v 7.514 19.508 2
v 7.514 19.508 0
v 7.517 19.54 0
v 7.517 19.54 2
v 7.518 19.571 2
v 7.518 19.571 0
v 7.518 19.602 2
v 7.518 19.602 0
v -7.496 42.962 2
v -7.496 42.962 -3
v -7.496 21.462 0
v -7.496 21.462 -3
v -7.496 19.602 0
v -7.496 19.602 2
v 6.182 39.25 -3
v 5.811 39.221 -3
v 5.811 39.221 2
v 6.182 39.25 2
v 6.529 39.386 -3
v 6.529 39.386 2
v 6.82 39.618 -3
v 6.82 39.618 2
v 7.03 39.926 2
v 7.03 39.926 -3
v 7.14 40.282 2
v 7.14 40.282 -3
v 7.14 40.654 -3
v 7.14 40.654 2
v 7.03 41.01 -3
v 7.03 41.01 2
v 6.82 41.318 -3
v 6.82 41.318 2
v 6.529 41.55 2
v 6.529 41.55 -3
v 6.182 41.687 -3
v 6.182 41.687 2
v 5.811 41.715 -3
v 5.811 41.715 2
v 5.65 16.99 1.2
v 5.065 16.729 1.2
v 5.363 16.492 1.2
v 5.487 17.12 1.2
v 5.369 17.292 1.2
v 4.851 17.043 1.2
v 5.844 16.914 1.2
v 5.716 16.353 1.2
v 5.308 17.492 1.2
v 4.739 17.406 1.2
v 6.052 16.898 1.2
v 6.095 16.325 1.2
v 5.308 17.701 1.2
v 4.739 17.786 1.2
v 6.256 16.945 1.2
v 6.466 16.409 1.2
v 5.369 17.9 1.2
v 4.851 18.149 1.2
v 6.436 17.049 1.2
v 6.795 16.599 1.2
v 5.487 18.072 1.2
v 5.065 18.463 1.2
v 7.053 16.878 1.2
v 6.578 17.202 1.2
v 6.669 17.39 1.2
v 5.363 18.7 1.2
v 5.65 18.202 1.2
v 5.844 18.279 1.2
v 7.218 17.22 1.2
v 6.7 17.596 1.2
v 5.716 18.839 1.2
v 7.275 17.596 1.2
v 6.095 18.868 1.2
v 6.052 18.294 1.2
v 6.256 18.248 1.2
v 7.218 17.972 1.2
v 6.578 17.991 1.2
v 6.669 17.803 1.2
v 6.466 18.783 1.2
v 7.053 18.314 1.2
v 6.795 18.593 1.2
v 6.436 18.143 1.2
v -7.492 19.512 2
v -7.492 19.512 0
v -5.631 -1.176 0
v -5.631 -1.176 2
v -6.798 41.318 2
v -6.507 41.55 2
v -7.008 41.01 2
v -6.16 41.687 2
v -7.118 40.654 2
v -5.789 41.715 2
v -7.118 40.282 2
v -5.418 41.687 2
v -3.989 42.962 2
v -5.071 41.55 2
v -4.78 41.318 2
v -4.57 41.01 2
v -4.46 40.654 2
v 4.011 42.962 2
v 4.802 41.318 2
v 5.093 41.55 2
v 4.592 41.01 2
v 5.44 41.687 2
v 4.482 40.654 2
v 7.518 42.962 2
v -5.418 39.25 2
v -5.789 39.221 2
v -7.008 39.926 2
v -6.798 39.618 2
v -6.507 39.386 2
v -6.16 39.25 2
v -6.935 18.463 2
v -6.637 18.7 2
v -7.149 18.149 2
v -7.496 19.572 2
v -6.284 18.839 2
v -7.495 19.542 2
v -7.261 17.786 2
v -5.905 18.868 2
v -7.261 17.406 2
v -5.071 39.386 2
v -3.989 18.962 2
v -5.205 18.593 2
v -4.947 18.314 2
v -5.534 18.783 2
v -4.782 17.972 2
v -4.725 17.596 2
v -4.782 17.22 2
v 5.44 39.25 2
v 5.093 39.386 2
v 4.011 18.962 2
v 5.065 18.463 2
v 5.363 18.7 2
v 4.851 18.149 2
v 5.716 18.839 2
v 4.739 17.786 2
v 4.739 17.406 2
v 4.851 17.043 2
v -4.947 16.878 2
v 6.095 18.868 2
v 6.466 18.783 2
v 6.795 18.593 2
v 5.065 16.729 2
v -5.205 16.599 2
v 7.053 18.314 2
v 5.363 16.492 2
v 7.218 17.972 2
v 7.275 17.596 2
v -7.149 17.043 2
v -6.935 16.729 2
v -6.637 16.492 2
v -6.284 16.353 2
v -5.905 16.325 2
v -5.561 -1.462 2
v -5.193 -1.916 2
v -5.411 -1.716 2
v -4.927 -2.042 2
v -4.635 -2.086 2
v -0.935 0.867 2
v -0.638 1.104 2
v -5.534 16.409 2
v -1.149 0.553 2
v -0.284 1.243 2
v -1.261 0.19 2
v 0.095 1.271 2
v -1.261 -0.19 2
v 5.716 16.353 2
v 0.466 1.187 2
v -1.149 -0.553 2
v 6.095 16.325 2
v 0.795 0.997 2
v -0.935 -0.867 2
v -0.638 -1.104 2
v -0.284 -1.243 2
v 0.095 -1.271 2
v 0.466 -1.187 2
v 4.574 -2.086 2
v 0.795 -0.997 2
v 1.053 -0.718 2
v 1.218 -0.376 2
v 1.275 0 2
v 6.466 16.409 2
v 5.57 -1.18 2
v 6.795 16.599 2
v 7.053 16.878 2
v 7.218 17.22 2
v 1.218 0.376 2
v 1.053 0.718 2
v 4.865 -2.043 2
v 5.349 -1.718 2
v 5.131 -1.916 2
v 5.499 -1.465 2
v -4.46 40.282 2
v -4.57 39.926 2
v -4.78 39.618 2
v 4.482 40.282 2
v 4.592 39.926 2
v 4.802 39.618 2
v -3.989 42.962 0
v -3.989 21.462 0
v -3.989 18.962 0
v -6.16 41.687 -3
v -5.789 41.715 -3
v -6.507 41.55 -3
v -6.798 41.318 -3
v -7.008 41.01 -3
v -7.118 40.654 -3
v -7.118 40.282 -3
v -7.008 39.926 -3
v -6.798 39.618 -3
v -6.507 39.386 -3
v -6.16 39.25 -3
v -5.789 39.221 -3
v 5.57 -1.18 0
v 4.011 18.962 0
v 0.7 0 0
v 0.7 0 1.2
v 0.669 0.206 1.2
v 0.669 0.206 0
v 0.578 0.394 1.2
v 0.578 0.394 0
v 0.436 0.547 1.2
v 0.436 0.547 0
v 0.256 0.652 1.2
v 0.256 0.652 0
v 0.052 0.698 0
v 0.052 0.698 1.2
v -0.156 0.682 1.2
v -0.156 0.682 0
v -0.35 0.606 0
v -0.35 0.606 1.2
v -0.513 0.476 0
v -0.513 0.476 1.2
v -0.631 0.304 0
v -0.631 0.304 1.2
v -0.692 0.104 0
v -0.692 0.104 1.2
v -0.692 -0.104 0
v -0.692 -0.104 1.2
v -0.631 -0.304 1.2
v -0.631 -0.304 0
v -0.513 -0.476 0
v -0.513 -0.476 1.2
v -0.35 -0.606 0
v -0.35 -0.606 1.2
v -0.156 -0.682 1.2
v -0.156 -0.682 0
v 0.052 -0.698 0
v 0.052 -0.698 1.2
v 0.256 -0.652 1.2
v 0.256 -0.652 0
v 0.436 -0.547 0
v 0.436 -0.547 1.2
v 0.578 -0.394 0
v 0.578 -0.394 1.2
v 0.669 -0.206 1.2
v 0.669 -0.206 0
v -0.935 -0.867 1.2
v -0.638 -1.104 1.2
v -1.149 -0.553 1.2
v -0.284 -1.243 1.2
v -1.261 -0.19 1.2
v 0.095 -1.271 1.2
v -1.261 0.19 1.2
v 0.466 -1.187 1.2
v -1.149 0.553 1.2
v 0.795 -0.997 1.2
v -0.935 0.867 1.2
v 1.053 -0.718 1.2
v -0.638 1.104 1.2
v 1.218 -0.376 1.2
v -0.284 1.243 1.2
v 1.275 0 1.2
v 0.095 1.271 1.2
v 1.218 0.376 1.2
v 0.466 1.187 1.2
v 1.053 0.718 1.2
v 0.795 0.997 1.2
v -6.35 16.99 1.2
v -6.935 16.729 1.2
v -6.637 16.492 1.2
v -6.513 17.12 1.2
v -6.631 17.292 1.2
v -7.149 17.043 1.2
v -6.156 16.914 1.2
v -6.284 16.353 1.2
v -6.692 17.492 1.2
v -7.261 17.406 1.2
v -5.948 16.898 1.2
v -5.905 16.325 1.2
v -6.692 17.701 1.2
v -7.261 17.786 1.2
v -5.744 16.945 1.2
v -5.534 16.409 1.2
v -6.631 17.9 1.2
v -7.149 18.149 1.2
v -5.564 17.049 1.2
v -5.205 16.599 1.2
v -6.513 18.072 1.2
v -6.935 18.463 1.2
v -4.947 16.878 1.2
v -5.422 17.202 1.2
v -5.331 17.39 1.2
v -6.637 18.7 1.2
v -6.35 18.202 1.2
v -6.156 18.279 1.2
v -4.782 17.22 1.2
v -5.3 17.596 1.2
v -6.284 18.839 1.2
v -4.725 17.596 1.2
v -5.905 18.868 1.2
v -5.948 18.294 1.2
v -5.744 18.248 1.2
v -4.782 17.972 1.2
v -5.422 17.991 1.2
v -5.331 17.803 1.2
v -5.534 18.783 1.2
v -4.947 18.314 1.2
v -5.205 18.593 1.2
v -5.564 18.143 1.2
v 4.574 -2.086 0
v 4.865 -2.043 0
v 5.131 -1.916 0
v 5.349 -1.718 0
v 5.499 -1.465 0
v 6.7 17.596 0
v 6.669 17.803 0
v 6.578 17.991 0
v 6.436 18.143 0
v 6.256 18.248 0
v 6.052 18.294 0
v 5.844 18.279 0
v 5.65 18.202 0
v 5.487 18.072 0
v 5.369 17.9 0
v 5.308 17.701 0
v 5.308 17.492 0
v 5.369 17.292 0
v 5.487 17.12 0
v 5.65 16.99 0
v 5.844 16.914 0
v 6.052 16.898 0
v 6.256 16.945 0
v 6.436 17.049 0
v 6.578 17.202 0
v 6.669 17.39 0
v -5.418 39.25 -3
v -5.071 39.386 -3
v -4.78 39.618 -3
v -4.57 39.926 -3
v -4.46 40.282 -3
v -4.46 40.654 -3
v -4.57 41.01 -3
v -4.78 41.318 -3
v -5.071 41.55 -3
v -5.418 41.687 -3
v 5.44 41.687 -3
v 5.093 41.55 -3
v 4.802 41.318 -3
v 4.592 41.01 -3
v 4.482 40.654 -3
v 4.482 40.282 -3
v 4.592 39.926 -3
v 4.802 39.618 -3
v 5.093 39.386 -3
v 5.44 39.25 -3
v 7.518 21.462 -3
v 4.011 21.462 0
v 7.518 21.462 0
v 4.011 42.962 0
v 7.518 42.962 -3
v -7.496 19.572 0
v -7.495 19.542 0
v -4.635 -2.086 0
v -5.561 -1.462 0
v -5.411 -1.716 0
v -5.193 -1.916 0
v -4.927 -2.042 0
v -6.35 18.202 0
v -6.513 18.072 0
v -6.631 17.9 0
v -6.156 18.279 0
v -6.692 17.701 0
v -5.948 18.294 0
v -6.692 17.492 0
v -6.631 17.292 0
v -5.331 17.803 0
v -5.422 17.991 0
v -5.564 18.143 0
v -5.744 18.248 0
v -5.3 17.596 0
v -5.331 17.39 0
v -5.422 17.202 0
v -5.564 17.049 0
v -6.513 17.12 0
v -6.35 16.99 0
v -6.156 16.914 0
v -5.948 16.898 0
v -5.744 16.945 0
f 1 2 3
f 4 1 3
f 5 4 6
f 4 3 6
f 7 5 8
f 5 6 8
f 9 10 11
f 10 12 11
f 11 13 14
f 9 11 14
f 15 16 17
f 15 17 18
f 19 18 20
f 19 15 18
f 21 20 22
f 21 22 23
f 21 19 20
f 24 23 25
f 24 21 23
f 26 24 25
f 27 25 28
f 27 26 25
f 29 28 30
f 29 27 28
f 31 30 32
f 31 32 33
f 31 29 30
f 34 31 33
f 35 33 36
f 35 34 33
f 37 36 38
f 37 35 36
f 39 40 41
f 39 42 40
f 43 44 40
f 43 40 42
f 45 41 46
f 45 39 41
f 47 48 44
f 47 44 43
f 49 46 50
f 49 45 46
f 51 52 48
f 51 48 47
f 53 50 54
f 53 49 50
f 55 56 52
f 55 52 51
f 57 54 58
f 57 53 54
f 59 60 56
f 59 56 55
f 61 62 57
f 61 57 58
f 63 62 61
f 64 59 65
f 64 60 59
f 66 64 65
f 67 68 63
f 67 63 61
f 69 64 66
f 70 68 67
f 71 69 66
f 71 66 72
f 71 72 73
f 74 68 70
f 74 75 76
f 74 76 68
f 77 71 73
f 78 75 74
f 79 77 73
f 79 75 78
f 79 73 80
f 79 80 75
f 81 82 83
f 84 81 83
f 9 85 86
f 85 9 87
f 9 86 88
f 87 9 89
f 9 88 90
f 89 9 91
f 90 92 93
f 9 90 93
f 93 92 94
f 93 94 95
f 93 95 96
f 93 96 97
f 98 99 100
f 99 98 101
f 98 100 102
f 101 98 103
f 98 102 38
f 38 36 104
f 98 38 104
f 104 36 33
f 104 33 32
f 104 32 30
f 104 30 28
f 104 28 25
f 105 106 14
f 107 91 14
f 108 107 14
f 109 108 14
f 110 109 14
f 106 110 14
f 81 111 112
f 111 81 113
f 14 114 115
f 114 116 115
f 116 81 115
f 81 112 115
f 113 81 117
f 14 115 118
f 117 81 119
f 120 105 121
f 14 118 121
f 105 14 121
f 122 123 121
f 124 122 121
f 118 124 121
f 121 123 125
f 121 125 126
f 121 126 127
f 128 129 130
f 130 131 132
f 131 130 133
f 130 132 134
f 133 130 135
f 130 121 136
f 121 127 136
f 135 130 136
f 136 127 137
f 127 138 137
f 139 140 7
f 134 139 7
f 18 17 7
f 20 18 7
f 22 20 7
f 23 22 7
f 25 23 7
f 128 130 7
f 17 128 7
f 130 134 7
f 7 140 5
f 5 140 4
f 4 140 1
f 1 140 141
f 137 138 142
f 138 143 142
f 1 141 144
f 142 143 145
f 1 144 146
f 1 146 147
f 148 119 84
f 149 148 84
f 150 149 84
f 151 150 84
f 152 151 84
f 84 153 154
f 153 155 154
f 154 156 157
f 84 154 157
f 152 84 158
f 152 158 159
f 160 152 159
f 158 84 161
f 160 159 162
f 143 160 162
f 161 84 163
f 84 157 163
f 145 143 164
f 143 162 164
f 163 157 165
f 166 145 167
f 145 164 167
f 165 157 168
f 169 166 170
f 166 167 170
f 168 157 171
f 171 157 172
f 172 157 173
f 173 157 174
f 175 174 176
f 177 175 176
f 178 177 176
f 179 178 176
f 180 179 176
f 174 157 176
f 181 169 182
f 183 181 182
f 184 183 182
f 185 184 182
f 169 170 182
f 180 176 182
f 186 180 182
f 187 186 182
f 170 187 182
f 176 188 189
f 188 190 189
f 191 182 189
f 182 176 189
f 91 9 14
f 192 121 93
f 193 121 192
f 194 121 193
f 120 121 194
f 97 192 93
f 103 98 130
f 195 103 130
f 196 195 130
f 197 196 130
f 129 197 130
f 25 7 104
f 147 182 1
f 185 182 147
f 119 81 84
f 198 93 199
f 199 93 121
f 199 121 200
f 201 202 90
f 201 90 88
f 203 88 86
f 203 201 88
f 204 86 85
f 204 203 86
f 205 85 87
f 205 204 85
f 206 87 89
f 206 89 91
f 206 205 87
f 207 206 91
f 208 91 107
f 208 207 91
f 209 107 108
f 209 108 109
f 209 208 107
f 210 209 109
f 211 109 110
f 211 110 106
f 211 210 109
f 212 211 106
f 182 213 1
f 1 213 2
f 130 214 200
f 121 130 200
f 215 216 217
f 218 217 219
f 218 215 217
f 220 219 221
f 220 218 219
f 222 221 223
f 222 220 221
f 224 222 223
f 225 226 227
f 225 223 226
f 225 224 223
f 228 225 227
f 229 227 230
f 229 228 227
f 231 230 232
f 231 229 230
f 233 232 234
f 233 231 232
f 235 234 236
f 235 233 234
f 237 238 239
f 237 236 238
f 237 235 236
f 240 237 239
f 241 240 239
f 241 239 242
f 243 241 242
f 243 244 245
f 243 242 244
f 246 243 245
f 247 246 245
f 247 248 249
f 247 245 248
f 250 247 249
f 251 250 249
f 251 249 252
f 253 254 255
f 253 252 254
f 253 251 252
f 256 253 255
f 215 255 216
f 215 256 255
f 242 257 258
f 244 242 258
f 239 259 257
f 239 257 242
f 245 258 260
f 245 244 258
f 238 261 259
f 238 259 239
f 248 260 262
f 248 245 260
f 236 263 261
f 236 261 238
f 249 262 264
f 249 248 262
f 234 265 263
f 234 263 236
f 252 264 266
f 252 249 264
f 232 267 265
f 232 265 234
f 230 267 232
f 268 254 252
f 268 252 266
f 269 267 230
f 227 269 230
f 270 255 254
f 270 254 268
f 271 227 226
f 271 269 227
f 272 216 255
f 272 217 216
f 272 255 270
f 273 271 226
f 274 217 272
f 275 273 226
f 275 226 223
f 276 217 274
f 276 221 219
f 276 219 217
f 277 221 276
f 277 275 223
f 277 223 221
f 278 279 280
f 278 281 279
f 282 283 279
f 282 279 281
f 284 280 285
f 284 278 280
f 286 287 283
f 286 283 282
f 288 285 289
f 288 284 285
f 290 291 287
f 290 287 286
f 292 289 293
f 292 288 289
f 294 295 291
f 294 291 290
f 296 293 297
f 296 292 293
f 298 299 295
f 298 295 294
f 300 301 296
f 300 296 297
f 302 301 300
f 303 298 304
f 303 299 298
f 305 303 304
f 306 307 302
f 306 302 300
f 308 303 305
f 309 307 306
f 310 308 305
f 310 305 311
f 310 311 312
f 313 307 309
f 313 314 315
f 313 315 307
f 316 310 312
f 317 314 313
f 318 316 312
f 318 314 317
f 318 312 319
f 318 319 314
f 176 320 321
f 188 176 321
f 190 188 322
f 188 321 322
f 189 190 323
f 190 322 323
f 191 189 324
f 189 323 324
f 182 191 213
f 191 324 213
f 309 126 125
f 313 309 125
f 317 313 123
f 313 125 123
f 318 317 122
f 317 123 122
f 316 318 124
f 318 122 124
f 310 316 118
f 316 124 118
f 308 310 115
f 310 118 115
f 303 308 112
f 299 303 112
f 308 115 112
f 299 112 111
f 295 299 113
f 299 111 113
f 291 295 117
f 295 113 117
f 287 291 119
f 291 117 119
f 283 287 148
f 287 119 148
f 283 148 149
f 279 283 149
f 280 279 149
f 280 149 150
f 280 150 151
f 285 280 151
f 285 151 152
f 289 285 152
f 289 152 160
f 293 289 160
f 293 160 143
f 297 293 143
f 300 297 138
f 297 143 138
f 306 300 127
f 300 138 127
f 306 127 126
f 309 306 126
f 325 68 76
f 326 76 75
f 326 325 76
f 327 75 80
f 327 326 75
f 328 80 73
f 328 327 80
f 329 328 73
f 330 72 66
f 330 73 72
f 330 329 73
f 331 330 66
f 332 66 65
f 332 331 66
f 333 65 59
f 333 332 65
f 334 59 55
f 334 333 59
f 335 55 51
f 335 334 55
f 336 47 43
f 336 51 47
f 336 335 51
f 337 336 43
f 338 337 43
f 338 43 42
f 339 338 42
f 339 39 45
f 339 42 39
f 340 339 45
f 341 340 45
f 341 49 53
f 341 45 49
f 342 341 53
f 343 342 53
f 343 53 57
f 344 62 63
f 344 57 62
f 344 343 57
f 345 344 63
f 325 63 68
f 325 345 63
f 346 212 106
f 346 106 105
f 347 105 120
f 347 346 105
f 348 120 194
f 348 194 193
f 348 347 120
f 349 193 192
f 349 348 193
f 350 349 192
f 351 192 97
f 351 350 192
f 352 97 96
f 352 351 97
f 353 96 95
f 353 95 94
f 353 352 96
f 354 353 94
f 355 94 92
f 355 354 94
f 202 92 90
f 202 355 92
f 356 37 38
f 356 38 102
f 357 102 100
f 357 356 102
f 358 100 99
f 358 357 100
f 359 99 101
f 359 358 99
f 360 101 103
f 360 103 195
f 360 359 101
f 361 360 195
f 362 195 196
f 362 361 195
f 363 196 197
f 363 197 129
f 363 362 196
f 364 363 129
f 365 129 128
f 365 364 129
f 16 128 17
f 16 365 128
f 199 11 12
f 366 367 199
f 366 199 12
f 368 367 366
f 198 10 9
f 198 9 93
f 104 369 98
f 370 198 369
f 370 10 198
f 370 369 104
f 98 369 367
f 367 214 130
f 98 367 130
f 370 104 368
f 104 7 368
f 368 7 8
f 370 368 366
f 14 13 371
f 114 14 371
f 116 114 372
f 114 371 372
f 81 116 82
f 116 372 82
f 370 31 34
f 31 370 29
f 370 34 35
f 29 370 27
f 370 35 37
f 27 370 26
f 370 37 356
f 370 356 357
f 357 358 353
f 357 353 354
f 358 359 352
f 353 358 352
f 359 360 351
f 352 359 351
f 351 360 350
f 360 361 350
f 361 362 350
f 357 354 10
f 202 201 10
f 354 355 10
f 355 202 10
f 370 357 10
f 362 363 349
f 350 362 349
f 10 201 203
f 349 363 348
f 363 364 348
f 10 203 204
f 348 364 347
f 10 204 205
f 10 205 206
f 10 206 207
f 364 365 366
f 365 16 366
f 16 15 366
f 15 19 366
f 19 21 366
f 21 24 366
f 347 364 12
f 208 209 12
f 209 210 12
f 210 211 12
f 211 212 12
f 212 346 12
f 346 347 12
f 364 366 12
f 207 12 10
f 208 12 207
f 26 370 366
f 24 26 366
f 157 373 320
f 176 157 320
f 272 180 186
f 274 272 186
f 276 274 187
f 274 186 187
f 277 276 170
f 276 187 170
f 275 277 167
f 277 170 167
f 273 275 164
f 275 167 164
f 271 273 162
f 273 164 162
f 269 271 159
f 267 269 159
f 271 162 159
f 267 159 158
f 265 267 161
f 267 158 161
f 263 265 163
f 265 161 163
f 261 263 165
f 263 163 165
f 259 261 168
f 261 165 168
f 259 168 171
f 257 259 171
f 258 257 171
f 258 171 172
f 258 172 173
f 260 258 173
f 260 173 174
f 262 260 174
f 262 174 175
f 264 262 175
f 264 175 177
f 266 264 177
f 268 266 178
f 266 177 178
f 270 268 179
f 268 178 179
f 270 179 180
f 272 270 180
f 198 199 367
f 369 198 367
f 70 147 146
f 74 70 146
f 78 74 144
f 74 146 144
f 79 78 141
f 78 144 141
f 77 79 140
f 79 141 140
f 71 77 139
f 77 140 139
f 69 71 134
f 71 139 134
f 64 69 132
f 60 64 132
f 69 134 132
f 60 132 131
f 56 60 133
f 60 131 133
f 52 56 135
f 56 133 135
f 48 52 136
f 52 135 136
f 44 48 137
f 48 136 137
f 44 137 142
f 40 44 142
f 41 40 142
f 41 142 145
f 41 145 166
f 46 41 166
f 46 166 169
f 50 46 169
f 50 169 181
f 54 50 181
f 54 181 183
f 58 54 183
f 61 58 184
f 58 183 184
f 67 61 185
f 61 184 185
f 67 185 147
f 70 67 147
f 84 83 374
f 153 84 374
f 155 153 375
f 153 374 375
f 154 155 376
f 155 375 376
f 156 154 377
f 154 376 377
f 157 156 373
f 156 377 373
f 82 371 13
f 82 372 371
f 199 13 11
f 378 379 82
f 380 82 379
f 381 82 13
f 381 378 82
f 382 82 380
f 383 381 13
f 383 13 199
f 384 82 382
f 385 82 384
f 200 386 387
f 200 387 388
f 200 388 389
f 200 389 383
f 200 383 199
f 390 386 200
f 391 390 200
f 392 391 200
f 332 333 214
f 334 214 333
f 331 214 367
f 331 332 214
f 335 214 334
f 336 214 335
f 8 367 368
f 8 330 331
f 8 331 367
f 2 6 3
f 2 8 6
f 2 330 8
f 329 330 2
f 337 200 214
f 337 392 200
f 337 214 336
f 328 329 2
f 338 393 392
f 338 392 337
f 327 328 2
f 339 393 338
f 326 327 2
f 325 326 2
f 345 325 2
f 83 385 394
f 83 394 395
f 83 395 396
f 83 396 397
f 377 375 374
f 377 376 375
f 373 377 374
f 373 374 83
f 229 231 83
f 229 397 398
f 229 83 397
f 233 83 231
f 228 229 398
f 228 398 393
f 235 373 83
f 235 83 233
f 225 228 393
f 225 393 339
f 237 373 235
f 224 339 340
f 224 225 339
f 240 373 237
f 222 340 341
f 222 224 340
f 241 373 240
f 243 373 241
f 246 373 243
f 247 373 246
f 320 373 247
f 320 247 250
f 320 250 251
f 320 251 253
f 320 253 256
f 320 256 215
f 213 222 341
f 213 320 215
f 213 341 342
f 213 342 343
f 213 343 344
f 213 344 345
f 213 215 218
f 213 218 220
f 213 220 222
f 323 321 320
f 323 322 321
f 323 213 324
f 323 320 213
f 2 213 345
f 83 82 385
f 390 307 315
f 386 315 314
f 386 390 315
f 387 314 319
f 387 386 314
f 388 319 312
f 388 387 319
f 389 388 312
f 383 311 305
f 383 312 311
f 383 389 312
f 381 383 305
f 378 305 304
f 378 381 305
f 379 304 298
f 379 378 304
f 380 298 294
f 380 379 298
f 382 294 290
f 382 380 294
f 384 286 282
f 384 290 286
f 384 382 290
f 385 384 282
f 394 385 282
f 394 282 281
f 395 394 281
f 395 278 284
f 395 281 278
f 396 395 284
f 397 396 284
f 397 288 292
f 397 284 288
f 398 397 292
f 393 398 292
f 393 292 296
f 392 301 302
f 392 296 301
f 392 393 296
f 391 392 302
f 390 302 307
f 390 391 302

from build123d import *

# Parameters (mm, degrees)
BOSS_EXTRUDE1_OUTLINE_R  = 0.7
BOSS_EXTRUDE1_DEPTH      = 2
BOSS_EXTRUDE2_DEPTH      = 0.86
BOSS_EXTRUDE2_DEPTH_BACK = 1
SKETCH2_W                = 15.014867696
SKETCH2_H                = 2
SKETCH3_W                = 8
SKETCH3_H                = 5
CUT_EXTRUDE1_DEPTH       = 23.82865975
SKETCH4_W                = 15.014867696
SKETCH4_H                = 1.5
BOSS_EXTRUDE3_DEPTH      = 5
SKETCH5_W                = 8
SKETCH5_H                = 4
CUT_EXTRUDE2_DEPTH       = 3
BOSS_EXTRUDE5_DEPTH      = 20
SKETCH9_R                = 1.275
CUT_EXTRUDE3_DEPTH       = 0.8
HOLE1_START              = -3
HOLE1_OUTLINE_R          = 1.25
HOLE1_DEPTH              = 5
HOLE2_START              = -3
HOLE2_DEPTH              = 5


# Read off the part's stored shape, not the designer's step: Boss-Extrude1, Hole1, Hole2
with BuildPart() as part:
    # Boss-Extrude1 outline → Boss-Extrude1 (new body)
    with BuildSketch(Plane.XY):
        with BuildLine():
            ThreePointArc((7.514083588, 19.508491868), (7.257921972, 20.275277178), (6.518471313, 20.602066422))
            Line((6.518471313, 20.602066422), (-6.496396384, 20.602066422))
            ThreePointArc((-6.496396384, 20.602066422), (-7.234510066, 20.276742783), (-7.49237209, 19.512442807))
            Line((-7.49237209, 19.512442807), (-5.630745451, -1.175574425))
            ThreePointArc((-5.630745451, -1.175574425), (-5.309446106, -1.824064491), (-4.634769745, -2.085950809))
            Line((-4.634769745, -2.085950809), (4.574067822, -2.085950809))
            ThreePointArc((4.574067822, -2.085950809), (5.247278579, -1.825401468), (5.569680097, -1.179525363))
            Line((5.569680097, -1.179525363), (7.514083588, 19.508491868))
        make_face()
        Circle(BOSS_EXTRUDE1_OUTLINE_R, mode=Mode.SUBTRACT)
        with Locations((-5.999999992, 17.596194699)):
            Circle(BOSS_EXTRUDE1_OUTLINE_R, mode=Mode.SUBTRACT)
        with Locations((6.000000016, 17.596194697)):
            Circle(BOSS_EXTRUDE1_OUTLINE_R, mode=Mode.SUBTRACT)
    extrude(amount=BOSS_EXTRUDE1_DEPTH)

    # Sketch2 → Boss-Extrude2 (add, two sides: drawn at the far end of the back side and taken through both)
    with BuildSketch(Plane(origin=(0, 20.602066422, 0), x_dir=(1, 0, 0), z_dir=(0, 1, 0)).offset(-BOSS_EXTRUDE2_DEPTH_BACK)):
        with Locations((0.011037464, -1)):
            Rectangle(SKETCH2_W, SKETCH2_H)
    extrude(amount=BOSS_EXTRUDE2_DEPTH + BOSS_EXTRUDE2_DEPTH_BACK)

    # Sketch3 → Cut-Extrude1 (cut, through all)
    with BuildSketch(Plane(origin=(0, 0, 0), x_dir=(-1, 0, 0), z_dir=(0, 0, -1))):
        with Locations((-0.011037464, 21.462066422)):
            Rectangle(SKETCH3_W, SKETCH3_H)
    extrude(amount=-CUT_EXTRUDE1_DEPTH, mode=Mode.SUBTRACT)

    # Sketch4 → Boss-Extrude3 (add)
    with BuildSketch(Plane.XY.offset(2)):
        with Locations((0.011037464, 22.212066422)):
            Rectangle(SKETCH4_W, SKETCH4_H)
    extrude(amount=-BOSS_EXTRUDE3_DEPTH)

    # Sketch5 → Cut-Extrude2 (cut)
    with BuildSketch(Plane(origin=(0, 22.962066422, 0), x_dir=(1, 0, 0), z_dir=(0, 1, 0))):
        with Locations((0.011037464, -2)):
            Rectangle(SKETCH5_W, SKETCH5_H)
    extrude(amount=-CUT_EXTRUDE2_DEPTH, mode=Mode.SUBTRACT)

    # Sketch6 → Boss-Extrude5 (add)
    with BuildSketch(Plane(origin=(0, 22.962066422, 0), x_dir=(1, 0, 0), z_dir=(0, 1, 0))):
        Polygon((-3.988962536, 0), (4.011037464, 0), (4.011037464, -2), (7.518471312, -2), (7.518471312, 3), (-7.496396384, 3), (-7.496396384, -2), (-3.988962536, -2), align=None)
    extrude(amount=BOSS_EXTRUDE5_DEPTH)

    # Sketch9 → Cut-Extrude3 (cut)
    with BuildSketch(Plane.XY.offset(2)):
        with Locations((-5.999999992, 17.596194699)):
            Circle(SKETCH9_R)
        with Locations((6.000000016, 17.596194697)):
            Circle(SKETCH9_R)
        Circle(SKETCH9_R)
    extrude(amount=-CUT_EXTRUDE3_DEPTH, mode=Mode.SUBTRACT)

    # Hole1 outline → Hole1 (cut)
    with BuildSketch(Plane.XY.offset(HOLE1_START)):
        with Locations((-5.881528688, 40.468009485)):
            Circle(HOLE1_OUTLINE_R)
        with Locations((5.718471312, 40.468009485)):
            Circle(HOLE1_OUTLINE_R)
    extrude(amount=HOLE1_DEPTH, mode=Mode.SUBTRACT)

    # Hole2 outline → Hole2 (cut)
    with BuildSketch(Plane.XY.offset(HOLE2_START)):
        with BuildLine():
            ThreePointArc((5.811037464, 41.714577376), (6.968471312, 40.468009485), (5.811037464, 39.221441594))
            ThreePointArc((5.811037464, 39.221441594), (7.153603616, 40.468009485), (5.811037464, 41.714577376))
        make_face()
        with BuildLine():
            ThreePointArc((-5.788962536, 41.714577376), (-4.631528688, 40.468009485), (-5.788962536, 39.221441594))
            ThreePointArc((-5.788962536, 39.221441594), (-4.446396384, 40.468009485), (-5.788962536, 41.714577376))
        make_face()
    extrude(amount=HOLE2_DEPTH, mode=Mode.SUBTRACT)


solid = part.part
